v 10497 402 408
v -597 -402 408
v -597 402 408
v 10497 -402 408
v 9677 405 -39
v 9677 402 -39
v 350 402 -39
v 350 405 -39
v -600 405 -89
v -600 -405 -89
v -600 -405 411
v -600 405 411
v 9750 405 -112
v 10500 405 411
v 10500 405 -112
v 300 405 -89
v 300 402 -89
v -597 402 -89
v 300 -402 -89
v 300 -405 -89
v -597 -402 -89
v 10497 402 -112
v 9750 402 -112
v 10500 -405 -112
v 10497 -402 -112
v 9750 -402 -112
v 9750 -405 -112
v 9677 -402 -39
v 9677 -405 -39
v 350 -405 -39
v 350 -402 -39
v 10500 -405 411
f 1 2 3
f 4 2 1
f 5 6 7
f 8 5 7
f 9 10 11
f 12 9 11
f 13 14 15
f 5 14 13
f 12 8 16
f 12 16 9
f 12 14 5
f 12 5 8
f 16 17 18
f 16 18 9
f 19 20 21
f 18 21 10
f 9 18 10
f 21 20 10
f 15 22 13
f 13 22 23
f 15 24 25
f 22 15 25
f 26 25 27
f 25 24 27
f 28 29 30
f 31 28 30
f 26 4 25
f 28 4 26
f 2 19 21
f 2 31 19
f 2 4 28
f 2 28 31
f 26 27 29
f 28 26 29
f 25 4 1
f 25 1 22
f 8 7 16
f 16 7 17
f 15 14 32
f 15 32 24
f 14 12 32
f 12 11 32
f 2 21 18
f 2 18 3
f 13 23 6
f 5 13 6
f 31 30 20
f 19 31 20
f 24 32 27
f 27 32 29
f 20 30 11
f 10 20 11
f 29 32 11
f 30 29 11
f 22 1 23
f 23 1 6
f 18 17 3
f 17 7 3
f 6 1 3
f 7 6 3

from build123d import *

# Parameters (mm, degrees)
EXTRUDE033_DEPTH = 402
EXTRUDE012_DEPTH = 405


with BuildPart() as extrude033:
    # Sketch034 → Extrude033 (new body, symmetric)
    with BuildSketch(Plane.XZ):
        Polygon((-597, -89), (-597, 411), (10497, 411), (10497, -112), (9747, -112), (9674, -39), (350, -39), (300, -89), align=None)
    extrude(amount=EXTRUDE033_DEPTH, both=True)


with BuildPart() as extrude033_1:
    # Extrude033 placement: moved
    add(extrude033.part.moved(Location((0, 0, -3))))


with BuildPart() as cut003:
    # Sketch020 → Extrude012 (new body, symmetric)
    with BuildSketch(Plane.XZ):
        Polygon((-600, -89), (-600, 411), (10500, 411), (10500, -112), (9750, -112), (9677, -39), (350, -39), (300, -89), align=None)
    extrude(amount=EXTRUDE012_DEPTH, both=True)

    # Cut003: cut Extrude033
    add(extrude033_1.part, mode=Mode.SUBTRACT)


solid = cut003.part
